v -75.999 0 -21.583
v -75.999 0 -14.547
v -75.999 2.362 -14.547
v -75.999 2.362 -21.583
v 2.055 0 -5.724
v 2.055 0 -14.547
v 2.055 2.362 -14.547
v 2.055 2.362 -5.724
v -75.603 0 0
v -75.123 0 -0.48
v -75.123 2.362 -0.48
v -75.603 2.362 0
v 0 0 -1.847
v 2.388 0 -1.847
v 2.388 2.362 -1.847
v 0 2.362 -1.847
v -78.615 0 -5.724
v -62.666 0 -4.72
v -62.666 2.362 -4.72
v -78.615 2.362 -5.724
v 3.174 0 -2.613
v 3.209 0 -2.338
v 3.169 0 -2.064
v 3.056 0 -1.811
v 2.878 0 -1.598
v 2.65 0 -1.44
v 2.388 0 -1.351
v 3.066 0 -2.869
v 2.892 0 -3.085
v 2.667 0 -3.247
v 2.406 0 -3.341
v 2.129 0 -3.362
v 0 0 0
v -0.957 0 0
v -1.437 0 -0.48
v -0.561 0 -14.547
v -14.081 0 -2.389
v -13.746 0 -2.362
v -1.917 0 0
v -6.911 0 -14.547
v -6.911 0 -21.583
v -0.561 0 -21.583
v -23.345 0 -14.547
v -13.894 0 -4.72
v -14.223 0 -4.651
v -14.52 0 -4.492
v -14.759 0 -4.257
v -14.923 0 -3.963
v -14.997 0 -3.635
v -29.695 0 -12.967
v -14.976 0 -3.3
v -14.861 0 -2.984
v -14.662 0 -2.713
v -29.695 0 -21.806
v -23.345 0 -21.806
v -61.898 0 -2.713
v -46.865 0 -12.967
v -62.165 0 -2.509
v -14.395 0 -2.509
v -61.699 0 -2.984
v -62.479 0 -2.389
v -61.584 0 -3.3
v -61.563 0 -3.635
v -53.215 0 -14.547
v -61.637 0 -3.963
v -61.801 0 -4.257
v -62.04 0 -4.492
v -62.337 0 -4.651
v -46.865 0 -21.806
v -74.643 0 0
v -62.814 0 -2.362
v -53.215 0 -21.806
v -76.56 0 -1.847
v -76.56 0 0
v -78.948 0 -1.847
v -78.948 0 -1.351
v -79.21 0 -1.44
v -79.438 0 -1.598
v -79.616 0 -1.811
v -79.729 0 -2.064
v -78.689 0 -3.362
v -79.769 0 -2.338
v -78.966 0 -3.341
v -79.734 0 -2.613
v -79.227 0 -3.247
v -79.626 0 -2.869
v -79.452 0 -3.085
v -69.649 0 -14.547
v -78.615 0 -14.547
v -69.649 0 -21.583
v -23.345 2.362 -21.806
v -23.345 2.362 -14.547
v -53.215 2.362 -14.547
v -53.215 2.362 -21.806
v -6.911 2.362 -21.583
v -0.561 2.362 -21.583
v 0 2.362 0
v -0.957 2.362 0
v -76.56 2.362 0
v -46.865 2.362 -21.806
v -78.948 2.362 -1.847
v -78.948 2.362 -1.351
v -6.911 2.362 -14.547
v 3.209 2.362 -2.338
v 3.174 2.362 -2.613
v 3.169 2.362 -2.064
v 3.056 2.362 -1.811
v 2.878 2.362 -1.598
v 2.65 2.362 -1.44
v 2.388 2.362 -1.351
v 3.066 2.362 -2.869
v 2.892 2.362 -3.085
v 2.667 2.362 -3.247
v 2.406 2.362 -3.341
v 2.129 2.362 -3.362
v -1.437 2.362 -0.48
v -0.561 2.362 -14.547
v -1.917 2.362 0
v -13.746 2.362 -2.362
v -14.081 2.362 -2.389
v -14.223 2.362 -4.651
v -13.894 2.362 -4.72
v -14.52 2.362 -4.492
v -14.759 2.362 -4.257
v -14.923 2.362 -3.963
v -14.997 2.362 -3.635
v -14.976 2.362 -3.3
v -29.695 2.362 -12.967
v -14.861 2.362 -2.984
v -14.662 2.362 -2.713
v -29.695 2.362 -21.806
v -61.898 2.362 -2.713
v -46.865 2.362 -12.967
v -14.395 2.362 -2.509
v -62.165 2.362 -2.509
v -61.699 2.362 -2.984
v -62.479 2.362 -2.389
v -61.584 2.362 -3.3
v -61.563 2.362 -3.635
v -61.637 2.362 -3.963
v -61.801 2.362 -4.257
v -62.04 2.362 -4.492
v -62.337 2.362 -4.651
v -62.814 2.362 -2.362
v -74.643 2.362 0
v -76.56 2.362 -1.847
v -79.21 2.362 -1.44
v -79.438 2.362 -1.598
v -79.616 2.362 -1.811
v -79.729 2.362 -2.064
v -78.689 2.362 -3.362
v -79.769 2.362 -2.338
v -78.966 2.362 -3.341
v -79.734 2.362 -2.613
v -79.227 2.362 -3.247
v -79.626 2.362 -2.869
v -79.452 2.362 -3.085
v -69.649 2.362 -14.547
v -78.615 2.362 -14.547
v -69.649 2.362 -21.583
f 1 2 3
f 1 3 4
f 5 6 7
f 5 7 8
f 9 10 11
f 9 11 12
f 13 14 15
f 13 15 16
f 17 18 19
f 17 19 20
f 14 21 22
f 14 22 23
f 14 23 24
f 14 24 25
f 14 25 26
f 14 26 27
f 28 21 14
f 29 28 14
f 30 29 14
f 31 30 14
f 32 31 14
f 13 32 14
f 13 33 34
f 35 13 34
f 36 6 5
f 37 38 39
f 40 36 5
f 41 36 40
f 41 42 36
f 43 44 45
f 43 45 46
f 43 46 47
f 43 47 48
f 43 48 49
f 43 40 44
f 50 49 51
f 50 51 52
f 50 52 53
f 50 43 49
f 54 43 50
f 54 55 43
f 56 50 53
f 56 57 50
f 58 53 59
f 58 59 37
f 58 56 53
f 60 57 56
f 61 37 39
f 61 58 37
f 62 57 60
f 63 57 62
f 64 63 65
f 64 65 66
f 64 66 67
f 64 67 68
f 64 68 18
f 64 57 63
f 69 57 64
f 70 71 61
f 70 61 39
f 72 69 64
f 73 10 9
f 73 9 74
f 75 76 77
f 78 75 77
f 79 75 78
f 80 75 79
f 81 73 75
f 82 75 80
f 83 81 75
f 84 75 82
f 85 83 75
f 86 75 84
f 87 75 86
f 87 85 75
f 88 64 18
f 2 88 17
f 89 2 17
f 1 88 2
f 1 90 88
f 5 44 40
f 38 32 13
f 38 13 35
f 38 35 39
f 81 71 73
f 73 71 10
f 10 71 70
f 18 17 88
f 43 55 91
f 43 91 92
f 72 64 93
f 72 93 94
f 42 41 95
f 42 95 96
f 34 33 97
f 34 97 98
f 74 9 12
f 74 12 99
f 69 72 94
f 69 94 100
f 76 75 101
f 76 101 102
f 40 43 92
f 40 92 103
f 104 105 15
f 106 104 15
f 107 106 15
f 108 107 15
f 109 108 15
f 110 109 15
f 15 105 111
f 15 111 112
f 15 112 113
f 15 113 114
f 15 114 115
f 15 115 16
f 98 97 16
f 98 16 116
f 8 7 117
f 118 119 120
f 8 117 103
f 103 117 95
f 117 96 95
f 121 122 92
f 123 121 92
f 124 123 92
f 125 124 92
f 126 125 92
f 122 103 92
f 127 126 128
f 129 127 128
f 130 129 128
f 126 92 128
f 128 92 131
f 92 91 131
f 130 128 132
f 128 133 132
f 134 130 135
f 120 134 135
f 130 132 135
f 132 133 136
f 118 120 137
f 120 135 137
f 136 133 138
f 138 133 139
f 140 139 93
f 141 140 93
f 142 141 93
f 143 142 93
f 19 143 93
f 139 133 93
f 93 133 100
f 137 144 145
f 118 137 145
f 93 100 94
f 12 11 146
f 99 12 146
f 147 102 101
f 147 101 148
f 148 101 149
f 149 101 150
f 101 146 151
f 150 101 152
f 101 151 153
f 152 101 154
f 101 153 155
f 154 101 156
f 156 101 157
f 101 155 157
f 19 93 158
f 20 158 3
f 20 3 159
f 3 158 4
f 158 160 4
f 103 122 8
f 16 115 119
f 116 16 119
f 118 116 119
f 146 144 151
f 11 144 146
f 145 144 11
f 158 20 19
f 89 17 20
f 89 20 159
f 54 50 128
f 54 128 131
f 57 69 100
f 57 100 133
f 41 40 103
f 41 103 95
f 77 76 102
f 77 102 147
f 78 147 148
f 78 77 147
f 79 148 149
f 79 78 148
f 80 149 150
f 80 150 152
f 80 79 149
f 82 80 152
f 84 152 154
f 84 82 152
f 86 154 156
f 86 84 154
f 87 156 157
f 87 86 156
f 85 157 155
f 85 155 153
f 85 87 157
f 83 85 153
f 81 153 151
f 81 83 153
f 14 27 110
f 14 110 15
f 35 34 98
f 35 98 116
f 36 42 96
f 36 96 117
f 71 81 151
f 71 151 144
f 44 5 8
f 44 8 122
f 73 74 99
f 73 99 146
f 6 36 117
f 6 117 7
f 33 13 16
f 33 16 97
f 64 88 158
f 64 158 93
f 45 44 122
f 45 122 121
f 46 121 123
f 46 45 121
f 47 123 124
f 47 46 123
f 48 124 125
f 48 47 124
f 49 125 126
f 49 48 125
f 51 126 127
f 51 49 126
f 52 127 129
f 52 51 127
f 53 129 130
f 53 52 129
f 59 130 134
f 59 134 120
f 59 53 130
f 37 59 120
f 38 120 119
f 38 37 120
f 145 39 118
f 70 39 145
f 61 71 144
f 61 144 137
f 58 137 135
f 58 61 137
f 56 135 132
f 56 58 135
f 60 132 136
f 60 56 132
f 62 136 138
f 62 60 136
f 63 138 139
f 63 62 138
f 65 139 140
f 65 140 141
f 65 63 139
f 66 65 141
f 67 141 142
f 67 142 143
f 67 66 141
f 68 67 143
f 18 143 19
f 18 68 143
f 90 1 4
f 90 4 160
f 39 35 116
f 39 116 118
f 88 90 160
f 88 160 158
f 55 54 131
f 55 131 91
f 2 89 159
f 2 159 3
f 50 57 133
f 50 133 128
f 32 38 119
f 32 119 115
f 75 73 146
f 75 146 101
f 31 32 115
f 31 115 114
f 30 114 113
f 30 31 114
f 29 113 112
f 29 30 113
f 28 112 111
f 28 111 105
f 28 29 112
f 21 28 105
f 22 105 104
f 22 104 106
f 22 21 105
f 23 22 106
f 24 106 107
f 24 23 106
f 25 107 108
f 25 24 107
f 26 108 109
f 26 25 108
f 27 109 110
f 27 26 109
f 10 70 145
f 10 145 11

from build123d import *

# Parameters (mm, degrees)
BOSS_EXTRUDE1_DEPTH = 2.3622


with BuildPart() as part:
    # Sketch1 → Boss-Extrude1 (new body)
    with BuildSketch(Plane(origin=(0, 0, 0), x_dir=(1, 0, 0), z_dir=(0, 1, 0))):
        with BuildLine():
            Line((2.055202021, 14.546975478), (2.055202021, 5.72400467))
            Line((2.055202021, 5.72400467), (-13.894021226, 4.719731013))
            ThreePointArc((-13.894021226, 4.719731013), (-14.998563485, 3.466742259), (-13.745574731, 2.3622))
            Line((-13.745574731, 2.3622), (2.129425269, 3.361800046))
            ThreePointArc((2.129425269, 3.361800046), (3.201004497, 2.477166942), (2.3876, 1.350565462))
            Line((2.3876, 1.350565462), (2.3876, 1.846546672))
            Line((2.3876, 1.846546672), (0, 1.846546672))
            Line((0, 1.846546672), (0, 0))
            Line((0, 0), (-0.956548556, 0))
            Line((-0.956548556, 0), (-1.436625807, 0.480077251))
            Line((-1.436625807, 0.480077251), (-1.916703058, 0))
            Line((-1.916703058, 0), (-74.6432929, 0))
            Line((-74.6432929, 0), (-75.123370151, 0.480077251))
            Line((-75.123370151, 0.480077251), (-75.603447402, 0))
            Line((-75.603447402, 0), (-76.559995958, 0))
            Line((-76.559995958, 0), (-76.559995958, 1.846546672))
            Line((-76.559995958, 1.846546672), (-78.947595958, 1.846546672))
            Line((-78.947595958, 1.846546672), (-78.947595958, 1.350565462))
            ThreePointArc((-78.947595958, 1.350565462), (-79.761000455, 2.477166942), (-78.689421226, 3.361800046))
            Line((-78.689421226, 3.361800046), (-62.814421226, 2.3622))
            ThreePointArc((-62.814421226, 2.3622), (-61.561432472, 3.466742259), (-62.665974731, 4.719731013))
            Line((-62.665974731, 4.719731013), (-78.615197979, 5.72400467))
            Line((-78.615197979, 5.72400467), (-78.615197979, 14.546975478))
            Line((-78.615197979, 14.546975478), (-75.998997979, 14.546975478))
            Line((-75.998997979, 14.546975478), (-75.998997979, 21.582775478))
            Line((-75.998997979, 21.582775478), (-69.648997979, 21.582775478))
            Line((-69.648997979, 21.582775478), (-69.648997979, 14.546975478))
            Line((-69.648997979, 14.546975478), (-53.215197979, 14.546975478))
            Line((-53.215197979, 14.546975478), (-53.215197979, 21.806295525))
            Line((-53.215197979, 21.806295525), (-46.865197979, 21.806295525))
            Line((-46.865197979, 21.806295525), (-46.865197979, 12.967095525))
            Line((-46.865197979, 12.967095525), (-29.694797979, 12.967095525))
            Line((-29.694797979, 12.967095525), (-29.694797979, 21.806295525))
            Line((-29.694797979, 21.806295525), (-23.344797979, 21.806295525))
            Line((-23.344797979, 21.806295525), (-23.344797979, 14.546975478))
            Line((-23.344797979, 14.546975478), (-6.910997979, 14.546975478))
            Line((-6.910997979, 14.546975478), (-6.910997979, 21.582775478))
            Line((-6.910997979, 21.582775478), (-0.560997979, 21.582775478))
            Line((-0.560997979, 21.582775478), (-0.560997979, 14.546975478))
            Line((-0.560997979, 14.546975478), (2.055202021, 14.546975478))
        make_face()
    extrude(amount=BOSS_EXTRUDE1_DEPTH)


solid = part.part
